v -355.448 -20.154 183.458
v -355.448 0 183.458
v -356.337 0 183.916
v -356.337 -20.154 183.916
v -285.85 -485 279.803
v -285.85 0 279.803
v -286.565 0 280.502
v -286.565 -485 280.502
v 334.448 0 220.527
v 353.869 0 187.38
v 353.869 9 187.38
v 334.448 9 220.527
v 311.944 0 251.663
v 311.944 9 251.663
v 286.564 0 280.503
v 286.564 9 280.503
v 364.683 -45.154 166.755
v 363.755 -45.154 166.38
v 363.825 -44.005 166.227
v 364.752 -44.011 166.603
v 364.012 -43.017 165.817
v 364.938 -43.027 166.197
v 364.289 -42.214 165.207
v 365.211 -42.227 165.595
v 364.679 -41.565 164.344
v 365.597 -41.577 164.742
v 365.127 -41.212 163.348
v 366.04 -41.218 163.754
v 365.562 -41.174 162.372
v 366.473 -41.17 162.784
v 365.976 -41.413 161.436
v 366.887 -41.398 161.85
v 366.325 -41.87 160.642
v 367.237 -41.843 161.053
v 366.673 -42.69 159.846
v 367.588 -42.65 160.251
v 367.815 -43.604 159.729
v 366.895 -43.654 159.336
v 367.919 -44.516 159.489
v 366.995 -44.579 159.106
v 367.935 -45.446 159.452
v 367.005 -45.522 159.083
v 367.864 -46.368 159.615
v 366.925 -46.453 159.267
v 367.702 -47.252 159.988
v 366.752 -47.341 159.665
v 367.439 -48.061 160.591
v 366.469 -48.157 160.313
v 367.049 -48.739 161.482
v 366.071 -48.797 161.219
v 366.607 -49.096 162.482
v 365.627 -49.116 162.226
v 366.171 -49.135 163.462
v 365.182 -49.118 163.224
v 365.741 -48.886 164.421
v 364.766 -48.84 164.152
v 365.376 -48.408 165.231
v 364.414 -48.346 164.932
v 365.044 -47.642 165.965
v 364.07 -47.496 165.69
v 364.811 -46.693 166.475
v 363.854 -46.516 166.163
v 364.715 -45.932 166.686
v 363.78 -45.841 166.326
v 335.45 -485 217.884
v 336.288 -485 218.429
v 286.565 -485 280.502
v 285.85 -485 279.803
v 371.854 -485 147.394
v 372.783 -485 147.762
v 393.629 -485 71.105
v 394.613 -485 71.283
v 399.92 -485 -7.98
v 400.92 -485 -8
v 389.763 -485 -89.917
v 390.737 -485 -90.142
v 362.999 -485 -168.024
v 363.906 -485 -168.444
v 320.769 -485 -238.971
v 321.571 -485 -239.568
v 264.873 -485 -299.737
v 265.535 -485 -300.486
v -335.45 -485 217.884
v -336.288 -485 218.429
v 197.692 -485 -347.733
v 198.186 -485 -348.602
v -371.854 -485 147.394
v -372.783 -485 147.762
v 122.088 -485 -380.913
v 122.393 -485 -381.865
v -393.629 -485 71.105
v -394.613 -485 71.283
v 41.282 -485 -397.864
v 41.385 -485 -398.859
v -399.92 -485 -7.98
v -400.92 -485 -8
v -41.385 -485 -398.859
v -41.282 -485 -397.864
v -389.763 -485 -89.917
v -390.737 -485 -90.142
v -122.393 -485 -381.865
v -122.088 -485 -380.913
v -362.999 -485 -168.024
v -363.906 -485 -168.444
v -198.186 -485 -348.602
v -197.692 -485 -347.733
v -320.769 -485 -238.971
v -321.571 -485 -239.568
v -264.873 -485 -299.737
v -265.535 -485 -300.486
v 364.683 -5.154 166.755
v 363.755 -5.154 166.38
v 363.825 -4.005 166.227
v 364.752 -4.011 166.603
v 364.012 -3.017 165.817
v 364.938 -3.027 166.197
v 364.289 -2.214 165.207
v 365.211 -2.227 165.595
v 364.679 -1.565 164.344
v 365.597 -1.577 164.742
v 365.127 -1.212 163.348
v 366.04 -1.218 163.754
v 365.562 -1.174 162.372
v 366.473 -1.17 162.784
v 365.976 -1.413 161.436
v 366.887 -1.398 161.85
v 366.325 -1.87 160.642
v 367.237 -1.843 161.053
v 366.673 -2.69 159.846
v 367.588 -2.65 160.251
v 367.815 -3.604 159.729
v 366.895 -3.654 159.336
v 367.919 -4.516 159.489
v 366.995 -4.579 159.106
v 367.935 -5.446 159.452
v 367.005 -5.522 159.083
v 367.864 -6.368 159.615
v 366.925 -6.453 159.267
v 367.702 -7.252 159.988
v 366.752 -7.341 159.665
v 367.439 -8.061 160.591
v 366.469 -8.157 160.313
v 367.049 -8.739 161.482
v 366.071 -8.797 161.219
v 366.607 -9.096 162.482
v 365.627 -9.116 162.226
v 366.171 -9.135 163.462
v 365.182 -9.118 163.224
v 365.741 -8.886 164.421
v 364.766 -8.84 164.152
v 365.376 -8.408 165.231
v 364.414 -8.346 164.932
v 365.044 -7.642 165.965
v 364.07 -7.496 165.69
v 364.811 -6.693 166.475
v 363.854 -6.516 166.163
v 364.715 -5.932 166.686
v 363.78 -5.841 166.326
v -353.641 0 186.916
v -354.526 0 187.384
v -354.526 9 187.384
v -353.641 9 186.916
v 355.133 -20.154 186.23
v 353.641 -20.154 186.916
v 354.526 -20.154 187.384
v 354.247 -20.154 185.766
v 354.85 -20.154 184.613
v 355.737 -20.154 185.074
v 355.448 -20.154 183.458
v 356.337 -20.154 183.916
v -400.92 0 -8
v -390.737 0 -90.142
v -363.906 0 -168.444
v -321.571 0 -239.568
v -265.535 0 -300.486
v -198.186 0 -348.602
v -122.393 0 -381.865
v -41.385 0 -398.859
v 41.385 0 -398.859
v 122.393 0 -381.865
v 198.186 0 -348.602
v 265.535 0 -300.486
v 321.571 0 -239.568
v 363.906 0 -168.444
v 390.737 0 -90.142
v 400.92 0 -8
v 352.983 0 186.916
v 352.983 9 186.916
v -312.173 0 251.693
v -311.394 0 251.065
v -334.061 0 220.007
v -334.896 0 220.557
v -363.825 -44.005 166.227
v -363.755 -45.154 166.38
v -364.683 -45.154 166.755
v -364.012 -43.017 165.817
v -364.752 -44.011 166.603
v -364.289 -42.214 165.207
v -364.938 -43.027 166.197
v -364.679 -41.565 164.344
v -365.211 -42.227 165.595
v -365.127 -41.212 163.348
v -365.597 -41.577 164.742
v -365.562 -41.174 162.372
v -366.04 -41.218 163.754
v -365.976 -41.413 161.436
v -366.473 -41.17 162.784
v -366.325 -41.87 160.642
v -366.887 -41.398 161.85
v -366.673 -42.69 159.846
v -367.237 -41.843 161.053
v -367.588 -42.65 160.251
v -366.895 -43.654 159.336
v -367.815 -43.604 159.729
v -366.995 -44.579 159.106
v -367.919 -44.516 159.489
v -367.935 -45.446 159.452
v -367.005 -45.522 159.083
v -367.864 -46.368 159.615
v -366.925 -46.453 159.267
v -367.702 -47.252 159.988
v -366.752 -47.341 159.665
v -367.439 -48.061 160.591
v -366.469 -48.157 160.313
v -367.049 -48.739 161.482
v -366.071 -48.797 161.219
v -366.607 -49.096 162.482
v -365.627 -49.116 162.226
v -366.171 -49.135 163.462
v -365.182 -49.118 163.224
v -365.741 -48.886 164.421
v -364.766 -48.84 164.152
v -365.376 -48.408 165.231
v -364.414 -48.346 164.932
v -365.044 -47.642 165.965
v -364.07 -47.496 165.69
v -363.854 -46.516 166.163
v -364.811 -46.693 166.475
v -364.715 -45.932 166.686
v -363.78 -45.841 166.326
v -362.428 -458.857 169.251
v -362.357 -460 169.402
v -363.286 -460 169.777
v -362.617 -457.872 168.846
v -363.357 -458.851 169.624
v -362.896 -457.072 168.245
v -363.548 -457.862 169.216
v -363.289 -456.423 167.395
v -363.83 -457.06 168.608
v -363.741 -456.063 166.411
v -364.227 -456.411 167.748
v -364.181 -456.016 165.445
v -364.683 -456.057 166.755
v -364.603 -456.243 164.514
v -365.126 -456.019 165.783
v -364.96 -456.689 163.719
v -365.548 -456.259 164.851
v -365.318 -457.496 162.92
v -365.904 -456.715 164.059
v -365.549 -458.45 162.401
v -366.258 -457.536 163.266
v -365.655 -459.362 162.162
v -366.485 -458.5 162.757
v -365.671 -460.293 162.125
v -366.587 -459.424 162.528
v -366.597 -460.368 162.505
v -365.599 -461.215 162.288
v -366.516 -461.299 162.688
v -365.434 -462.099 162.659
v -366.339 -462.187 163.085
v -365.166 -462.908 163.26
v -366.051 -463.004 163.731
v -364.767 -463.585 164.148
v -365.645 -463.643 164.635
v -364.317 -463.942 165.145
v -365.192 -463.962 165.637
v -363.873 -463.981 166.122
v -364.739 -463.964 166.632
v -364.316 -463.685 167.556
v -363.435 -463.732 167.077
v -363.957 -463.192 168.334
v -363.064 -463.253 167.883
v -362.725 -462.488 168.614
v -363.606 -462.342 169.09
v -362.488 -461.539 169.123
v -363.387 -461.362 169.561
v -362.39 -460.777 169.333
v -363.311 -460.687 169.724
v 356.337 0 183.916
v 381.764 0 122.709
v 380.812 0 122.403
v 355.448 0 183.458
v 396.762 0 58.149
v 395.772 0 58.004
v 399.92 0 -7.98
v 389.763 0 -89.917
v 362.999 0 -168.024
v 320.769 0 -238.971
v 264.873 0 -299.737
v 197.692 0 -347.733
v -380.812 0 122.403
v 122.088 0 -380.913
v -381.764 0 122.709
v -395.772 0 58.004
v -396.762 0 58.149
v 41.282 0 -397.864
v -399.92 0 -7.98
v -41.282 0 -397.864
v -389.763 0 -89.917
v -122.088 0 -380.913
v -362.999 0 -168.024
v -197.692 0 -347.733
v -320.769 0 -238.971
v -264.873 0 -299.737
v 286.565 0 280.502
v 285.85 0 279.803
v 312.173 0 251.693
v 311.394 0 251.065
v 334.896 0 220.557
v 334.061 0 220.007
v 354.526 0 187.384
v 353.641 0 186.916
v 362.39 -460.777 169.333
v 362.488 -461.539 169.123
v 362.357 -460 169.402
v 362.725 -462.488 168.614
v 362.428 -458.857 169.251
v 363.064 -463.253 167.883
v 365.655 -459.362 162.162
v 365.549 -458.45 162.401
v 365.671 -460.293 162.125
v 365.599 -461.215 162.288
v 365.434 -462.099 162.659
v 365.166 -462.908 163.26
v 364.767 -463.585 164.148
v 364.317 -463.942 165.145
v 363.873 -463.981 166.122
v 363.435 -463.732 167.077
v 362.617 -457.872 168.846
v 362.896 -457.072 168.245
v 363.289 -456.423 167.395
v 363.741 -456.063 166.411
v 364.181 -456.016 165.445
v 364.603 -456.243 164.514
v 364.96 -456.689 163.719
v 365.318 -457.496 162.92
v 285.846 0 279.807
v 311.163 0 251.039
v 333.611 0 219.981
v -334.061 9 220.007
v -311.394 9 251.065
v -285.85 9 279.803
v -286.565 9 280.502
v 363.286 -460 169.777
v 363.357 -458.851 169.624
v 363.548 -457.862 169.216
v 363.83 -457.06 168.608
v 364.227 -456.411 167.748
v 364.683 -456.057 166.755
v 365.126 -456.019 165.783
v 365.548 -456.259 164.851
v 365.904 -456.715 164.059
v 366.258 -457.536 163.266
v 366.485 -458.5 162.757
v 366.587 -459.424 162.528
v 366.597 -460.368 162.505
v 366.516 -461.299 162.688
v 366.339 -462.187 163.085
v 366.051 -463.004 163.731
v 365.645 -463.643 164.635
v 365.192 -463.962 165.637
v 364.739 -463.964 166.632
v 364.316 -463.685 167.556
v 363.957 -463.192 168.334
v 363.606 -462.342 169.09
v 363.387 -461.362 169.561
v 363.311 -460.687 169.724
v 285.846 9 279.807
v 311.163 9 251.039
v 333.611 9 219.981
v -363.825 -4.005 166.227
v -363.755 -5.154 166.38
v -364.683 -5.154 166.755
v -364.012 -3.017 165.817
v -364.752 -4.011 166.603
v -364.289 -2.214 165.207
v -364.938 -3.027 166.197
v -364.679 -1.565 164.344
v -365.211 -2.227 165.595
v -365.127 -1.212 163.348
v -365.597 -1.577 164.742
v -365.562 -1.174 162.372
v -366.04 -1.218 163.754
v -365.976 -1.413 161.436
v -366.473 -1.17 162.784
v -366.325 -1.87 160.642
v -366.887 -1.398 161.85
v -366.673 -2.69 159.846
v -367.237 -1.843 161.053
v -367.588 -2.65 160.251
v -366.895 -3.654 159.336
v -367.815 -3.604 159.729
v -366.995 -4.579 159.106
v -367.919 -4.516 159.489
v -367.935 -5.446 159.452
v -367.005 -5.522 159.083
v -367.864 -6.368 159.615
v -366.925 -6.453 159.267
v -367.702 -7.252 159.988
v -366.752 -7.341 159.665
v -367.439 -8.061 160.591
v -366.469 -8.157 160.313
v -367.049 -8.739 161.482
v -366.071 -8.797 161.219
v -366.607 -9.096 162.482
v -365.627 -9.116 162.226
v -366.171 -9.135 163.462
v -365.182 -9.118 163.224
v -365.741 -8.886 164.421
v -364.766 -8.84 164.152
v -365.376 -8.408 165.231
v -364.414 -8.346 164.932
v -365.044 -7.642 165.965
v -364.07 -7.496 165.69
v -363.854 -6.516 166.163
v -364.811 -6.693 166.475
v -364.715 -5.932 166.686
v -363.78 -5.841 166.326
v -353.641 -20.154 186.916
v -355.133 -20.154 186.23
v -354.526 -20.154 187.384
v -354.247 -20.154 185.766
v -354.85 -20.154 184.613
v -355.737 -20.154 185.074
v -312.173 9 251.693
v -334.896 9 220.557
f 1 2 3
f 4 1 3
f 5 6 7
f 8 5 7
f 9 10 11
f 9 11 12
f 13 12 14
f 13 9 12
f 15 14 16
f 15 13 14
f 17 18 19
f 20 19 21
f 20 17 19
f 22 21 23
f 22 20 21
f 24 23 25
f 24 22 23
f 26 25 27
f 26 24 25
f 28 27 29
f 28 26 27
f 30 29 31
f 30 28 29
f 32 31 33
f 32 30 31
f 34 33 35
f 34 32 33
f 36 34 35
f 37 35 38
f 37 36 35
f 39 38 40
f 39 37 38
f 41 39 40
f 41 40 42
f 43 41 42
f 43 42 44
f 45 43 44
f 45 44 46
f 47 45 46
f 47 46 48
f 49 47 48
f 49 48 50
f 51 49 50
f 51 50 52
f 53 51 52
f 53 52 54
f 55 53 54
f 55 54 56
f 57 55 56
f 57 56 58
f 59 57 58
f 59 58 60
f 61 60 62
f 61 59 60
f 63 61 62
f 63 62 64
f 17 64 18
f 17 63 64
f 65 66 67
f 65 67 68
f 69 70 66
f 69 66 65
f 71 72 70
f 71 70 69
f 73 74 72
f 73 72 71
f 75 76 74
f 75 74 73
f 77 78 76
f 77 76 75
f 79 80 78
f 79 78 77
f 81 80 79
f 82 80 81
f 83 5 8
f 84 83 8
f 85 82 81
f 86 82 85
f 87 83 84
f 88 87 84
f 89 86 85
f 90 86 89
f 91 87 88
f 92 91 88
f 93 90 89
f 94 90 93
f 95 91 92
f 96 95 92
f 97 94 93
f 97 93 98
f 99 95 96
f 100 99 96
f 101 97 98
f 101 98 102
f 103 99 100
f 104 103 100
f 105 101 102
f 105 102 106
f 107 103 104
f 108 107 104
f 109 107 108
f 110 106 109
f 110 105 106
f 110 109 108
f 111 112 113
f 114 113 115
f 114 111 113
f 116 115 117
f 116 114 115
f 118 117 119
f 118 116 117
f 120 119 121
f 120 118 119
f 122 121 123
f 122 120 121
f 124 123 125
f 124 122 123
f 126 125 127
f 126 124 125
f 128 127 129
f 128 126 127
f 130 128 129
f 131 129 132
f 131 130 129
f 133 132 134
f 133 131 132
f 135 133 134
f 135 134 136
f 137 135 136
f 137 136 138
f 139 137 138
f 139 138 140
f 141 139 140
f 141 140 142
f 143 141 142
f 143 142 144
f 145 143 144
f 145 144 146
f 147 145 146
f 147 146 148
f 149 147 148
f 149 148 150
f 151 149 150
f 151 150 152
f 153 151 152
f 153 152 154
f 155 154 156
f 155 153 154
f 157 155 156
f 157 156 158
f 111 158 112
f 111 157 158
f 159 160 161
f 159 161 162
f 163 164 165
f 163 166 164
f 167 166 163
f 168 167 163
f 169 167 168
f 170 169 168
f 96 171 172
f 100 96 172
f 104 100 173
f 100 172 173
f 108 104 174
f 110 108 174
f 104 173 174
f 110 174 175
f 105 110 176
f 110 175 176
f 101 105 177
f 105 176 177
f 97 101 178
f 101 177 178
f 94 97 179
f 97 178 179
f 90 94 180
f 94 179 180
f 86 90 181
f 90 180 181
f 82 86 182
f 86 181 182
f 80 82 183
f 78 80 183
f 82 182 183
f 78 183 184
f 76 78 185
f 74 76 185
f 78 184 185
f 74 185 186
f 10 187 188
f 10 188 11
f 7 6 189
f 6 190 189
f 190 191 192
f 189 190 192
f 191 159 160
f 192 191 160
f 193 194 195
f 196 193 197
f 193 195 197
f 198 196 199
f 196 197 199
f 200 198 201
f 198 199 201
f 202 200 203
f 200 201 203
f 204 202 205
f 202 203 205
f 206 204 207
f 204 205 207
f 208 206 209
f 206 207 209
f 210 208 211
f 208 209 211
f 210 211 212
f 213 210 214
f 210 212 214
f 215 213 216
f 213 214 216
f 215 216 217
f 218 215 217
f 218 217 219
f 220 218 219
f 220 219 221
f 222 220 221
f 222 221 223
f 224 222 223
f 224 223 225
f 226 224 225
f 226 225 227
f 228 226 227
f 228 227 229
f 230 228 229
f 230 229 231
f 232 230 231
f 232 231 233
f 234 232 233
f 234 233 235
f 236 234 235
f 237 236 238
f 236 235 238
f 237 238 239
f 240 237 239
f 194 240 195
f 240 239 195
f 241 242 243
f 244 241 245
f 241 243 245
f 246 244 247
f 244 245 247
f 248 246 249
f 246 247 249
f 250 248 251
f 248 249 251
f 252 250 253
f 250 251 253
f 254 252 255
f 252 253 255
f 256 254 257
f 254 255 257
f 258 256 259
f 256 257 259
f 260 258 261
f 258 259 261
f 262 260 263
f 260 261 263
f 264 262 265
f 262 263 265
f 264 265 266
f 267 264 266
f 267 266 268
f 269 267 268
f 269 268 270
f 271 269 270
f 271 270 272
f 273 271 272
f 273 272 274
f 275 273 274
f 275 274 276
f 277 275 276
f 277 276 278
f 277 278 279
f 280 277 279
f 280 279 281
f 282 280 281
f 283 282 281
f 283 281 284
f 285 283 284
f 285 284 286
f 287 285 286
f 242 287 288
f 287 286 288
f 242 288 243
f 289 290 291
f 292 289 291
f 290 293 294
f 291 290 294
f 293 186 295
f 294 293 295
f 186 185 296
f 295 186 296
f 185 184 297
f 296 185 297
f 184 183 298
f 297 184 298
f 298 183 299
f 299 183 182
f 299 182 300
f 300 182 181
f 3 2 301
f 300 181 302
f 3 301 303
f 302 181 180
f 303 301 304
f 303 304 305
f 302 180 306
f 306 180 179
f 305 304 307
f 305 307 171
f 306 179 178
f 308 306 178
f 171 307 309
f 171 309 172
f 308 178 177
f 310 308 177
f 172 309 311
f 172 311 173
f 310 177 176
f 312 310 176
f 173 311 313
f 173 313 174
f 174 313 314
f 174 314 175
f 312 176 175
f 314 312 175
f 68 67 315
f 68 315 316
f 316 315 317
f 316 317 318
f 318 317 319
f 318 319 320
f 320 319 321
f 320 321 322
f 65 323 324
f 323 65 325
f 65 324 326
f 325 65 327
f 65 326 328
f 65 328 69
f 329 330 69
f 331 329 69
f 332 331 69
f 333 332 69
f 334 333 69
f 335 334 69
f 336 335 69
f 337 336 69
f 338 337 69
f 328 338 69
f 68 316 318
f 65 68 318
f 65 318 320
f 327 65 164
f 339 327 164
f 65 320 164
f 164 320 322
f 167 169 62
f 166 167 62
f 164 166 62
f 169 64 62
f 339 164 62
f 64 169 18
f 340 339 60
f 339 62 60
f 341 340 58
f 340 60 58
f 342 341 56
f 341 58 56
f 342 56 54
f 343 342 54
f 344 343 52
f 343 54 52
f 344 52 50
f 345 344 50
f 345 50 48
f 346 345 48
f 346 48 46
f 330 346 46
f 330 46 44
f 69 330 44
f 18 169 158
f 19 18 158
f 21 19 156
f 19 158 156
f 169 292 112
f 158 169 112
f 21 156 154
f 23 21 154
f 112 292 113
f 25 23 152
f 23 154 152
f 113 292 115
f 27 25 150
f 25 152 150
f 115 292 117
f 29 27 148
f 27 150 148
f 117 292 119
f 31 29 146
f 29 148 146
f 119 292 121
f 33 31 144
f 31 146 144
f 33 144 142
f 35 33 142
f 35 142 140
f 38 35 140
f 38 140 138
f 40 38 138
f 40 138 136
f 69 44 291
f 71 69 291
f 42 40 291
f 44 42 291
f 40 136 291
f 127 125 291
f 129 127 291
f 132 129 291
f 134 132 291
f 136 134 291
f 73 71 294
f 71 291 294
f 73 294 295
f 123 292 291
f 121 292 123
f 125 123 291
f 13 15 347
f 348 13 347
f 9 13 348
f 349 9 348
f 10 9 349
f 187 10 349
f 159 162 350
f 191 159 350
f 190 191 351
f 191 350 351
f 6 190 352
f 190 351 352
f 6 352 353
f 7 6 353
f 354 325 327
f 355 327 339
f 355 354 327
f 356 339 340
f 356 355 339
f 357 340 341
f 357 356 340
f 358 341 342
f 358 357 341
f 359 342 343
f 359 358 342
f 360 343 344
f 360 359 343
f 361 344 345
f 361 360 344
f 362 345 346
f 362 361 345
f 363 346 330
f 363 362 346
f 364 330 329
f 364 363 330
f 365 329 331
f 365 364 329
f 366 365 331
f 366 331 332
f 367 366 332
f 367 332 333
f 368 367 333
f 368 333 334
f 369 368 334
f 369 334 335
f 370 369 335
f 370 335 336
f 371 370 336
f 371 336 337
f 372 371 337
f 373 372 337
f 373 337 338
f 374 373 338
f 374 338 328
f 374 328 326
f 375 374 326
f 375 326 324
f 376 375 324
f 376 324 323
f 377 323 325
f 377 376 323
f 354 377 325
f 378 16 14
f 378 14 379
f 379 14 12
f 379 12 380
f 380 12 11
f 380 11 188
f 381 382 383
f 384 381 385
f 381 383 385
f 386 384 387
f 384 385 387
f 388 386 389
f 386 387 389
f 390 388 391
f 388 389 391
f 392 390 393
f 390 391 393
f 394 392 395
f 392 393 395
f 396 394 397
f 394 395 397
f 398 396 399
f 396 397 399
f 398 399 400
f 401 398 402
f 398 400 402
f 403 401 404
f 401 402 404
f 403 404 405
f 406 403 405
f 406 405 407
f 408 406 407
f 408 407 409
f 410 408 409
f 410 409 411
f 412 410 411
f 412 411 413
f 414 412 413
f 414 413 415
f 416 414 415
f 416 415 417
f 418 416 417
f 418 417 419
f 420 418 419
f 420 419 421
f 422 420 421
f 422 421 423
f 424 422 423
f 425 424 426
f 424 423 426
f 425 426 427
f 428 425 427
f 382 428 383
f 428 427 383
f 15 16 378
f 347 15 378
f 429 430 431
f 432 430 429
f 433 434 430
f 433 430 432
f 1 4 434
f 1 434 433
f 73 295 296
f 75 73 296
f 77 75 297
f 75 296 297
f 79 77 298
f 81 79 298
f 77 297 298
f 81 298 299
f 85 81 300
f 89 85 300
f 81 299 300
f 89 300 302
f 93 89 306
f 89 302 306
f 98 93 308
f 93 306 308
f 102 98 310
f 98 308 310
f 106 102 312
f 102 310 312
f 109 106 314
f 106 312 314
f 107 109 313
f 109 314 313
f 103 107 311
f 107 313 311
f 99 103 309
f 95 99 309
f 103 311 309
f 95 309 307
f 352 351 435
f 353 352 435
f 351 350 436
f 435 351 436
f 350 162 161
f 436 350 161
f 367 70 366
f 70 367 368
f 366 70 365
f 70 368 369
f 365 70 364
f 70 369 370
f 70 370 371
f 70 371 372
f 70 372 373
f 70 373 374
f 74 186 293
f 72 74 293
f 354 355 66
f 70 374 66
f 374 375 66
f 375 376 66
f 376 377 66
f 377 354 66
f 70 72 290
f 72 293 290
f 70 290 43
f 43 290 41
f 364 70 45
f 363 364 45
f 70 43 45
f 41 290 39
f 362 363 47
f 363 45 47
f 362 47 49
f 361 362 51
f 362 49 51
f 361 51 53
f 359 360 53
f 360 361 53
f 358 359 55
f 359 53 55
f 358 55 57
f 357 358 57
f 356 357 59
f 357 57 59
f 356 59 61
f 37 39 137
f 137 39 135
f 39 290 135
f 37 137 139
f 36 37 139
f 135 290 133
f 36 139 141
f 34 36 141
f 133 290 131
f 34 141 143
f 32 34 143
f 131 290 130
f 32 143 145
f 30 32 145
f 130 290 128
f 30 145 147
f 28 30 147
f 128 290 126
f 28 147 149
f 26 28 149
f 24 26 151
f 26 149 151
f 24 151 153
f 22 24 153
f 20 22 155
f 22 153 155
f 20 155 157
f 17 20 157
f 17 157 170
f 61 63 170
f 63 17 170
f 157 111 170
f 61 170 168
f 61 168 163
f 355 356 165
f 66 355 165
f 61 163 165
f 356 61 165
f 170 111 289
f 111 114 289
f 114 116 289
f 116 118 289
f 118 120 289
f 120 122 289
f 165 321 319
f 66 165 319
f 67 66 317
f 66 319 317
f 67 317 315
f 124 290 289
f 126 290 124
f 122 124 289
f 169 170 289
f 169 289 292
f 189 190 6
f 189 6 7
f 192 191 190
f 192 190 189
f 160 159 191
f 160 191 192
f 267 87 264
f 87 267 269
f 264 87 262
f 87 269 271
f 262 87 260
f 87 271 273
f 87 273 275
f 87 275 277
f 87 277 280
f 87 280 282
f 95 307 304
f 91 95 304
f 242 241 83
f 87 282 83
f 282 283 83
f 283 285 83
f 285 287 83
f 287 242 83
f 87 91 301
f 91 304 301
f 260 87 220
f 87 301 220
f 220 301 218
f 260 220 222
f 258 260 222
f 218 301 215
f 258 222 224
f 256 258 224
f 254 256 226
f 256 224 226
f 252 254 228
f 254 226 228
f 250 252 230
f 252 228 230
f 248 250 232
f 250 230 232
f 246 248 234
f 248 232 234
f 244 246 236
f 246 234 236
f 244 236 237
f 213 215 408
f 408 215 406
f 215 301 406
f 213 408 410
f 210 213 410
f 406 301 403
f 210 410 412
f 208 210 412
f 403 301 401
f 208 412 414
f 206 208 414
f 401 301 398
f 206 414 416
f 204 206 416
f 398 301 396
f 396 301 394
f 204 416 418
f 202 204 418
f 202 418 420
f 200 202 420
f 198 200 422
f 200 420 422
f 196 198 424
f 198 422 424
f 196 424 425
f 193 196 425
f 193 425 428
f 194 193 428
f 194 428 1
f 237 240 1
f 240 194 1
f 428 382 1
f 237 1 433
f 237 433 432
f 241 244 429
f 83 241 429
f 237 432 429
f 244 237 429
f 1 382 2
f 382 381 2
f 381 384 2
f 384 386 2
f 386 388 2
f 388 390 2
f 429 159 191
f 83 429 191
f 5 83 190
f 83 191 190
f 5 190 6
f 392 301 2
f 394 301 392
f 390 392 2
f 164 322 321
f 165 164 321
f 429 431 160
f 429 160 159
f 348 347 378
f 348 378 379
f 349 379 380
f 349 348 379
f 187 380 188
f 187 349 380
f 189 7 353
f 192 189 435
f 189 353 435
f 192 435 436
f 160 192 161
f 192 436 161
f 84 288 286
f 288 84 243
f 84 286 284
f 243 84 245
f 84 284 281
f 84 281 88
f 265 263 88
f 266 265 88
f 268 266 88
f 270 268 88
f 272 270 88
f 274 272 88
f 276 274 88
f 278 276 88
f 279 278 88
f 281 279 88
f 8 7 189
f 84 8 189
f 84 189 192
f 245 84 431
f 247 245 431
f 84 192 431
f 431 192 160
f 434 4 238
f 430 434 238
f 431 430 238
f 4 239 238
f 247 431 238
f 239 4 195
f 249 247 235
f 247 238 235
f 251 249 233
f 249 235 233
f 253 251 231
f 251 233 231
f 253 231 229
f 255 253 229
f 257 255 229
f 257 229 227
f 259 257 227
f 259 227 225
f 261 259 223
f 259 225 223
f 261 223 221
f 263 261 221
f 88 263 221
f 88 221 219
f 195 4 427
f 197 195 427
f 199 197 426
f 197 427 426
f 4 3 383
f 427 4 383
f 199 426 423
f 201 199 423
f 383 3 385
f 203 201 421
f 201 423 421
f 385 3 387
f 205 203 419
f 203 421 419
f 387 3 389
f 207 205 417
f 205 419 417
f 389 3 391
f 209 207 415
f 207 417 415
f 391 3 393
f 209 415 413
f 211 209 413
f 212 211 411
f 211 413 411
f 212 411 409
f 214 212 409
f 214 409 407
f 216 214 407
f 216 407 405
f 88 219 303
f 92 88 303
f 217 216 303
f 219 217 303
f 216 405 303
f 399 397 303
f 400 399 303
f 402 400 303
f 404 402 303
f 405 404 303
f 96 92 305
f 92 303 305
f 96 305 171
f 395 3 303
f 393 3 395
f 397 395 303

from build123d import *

# Parameters (mm, degrees)
SM_BASE_FLANGE_1_DEPTH = 485
CUT_EXTRUDE_START      = -20.154266119
CUT_EXTRUDE_5_DEPTH    = 20.154266119
SM_START               = 9
SM_BASE_FLANGE_3_DEPTH = 9
SM_BASE_FLANGE_4_DEPTH = 9
SKETCH_12_R            = 4
CUT_EXTRUDE_6_DEPTH    = 80


# Read off the part's stored shape, not the designer's step: Вырез-Вытянуть5
# Sheet-metal steps are written as plain solids
with BuildPart() as part:
    # Sketch 1 → Базовая кромка1 (new body)
    with BuildSketch(Plane(origin=(0, 0, 0), x_dir=(1, 0, 0), z_dir=(0, 1, 0))):
        with BuildLine():
            ThreePointArc((-286.564771423, -280.502463054), (-372.783196213, -147.762270629), (-400.920191559, 8))
            ThreePointArc((-400.920191559, 8), (0, 401), (400.920191559, 8))
            ThreePointArc((400.920191559, 8), (372.783196213, -147.762270629), (286.564771423, -280.502463054))
            Line((286.564771423, -280.502463054), (285.850146058, -279.802955665))
            ThreePointArc((285.850146058, -279.802955665), (371.853562307, -147.393786163), (399.920390583, 7.980049875))
            ThreePointArc((399.920390583, 7.980049875), (0, 400), (-399.920390583, 7.980049875))
            ThreePointArc((-399.920390583, 7.980049875), (-371.853562307, -147.393786163), (-285.850146058, -279.802955665))
            Line((-285.850146058, -279.802955665), (-286.564771423, -280.502463054))
        make_face()
    extrude(amount=-SM_BASE_FLANGE_1_DEPTH)

    # Вырез-Вытянуть5 outline → Вырез-Вытянуть5 (cut)
    with BuildSketch(Plane(origin=(0, 0, 0), x_dir=(1, 0, 0), z_dir=(0, 1, 0)).offset(CUT_EXTRUDE_START)):
        with BuildLine():
            Line((353.641413762, -186.916426438), (354.525517296, -187.383717505))
            ThreePointArc((354.525517296, -187.383717505), (355.435269498, -185.652280345), (356.336565744, -183.916426438))
            Line((356.336565744, -183.916426438), (355.447945879, -183.457781984))
            ThreePointArc((355.447945879, -183.457781984), (354.548897255, -185.189307077), (353.641413762, -186.916426438))
        make_face()
        with BuildLine():
            Line((-355.447945879, -183.457781984), (-356.336565744, -183.916426438))
            ThreePointArc((-356.336565744, -183.916426438), (-355.435269498, -185.652280345), (-354.525517296, -187.383717505))
            Line((-354.525517296, -187.383717505), (-353.641413762, -186.916426438))
            ThreePointArc((-353.641413762, -186.916426438), (-354.548897255, -185.189307077), (-355.447945879, -183.457781984))
        make_face()
    extrude(amount=CUT_EXTRUDE_5_DEPTH, mode=Mode.SUBTRACT)

    # Эскиз12 → Вырез-Вытянуть6 (cut)
    with BuildSketch(Plane(origin=(-379.218196518, 0, 153.214096707), x_dir=(0.37460659341590985, 0, 0.9271838545667883), z_dir=(-0.9271838545667883, 0, 0.37460659341590985))):
        with Locations((14, -45.154266119)):
            Circle(SKETCH_12_R)
        with Locations((14, -5.154266119)):
            Circle(SKETCH_12_R)
        with Locations((17.325607974, -460)):
            Circle(SKETCH_12_R)
    cut_extrude_6 = extrude(amount=-CUT_EXTRUDE_6_DEPTH, mode=Mode.SUBTRACT)

    # Зеркальное отражение2: Вырез-Вытянуть6 across plane
    add(cut_extrude_6.mirror(Plane(origin=(0, 0, 0), x_dir=(0, 0, 1), z_dir=(1, 0, 0))), mode=Mode.SUBTRACT)


with BuildPart() as body_2:
    # Эскиз9 → Базовая кромка3 (new body)
    with BuildSketch(Plane(origin=(0, 0, 0), x_dir=(1, 0, 0), z_dir=(0, 1, 0)).offset(SM_START)):
        with BuildLine():
            ThreePointArc((-353.641413762, -186.916426438), (-323.101130605, -235.808522751), (-285.850146058, -279.802955665))
            Line((-285.850146058, -279.802955665), (-286.564771423, -280.502463054))
            ThreePointArc((-286.564771423, -280.502463054), (-323.908883431, -236.398044058), (-354.525517296, -187.383717505))
            Line((-354.525517296, -187.383717505), (-353.641413762, -186.916426438))
        make_face()
    extrude(amount=-SM_BASE_FLANGE_3_DEPTH)


with BuildPart() as body_3:
    # Эскиз11 → Базовая кромка4 (new body)
    with BuildSketch(Plane(origin=(0, 0, 0), x_dir=(1, 0, 0), z_dir=(0, 1, 0))):
        with BuildLine():
            ThreePointArc((285.845982484, -279.807234702), (322.758831311, -235.778915861), (352.983132723, -186.916426438))
            Line((352.983132723, -186.916426438), (353.869168307, -187.380043678))
            ThreePointArc((353.869168307, -187.380043678), (323.569306141, -236.364689324), (286.564175192, -280.503078962))
            Line((286.564175192, -280.503078962), (285.845982484, -279.807234702))
        make_face()
    extrude(amount=SM_BASE_FLANGE_4_DEPTH)


solid = Compound([part.part, body_2.part, body_3.part])
